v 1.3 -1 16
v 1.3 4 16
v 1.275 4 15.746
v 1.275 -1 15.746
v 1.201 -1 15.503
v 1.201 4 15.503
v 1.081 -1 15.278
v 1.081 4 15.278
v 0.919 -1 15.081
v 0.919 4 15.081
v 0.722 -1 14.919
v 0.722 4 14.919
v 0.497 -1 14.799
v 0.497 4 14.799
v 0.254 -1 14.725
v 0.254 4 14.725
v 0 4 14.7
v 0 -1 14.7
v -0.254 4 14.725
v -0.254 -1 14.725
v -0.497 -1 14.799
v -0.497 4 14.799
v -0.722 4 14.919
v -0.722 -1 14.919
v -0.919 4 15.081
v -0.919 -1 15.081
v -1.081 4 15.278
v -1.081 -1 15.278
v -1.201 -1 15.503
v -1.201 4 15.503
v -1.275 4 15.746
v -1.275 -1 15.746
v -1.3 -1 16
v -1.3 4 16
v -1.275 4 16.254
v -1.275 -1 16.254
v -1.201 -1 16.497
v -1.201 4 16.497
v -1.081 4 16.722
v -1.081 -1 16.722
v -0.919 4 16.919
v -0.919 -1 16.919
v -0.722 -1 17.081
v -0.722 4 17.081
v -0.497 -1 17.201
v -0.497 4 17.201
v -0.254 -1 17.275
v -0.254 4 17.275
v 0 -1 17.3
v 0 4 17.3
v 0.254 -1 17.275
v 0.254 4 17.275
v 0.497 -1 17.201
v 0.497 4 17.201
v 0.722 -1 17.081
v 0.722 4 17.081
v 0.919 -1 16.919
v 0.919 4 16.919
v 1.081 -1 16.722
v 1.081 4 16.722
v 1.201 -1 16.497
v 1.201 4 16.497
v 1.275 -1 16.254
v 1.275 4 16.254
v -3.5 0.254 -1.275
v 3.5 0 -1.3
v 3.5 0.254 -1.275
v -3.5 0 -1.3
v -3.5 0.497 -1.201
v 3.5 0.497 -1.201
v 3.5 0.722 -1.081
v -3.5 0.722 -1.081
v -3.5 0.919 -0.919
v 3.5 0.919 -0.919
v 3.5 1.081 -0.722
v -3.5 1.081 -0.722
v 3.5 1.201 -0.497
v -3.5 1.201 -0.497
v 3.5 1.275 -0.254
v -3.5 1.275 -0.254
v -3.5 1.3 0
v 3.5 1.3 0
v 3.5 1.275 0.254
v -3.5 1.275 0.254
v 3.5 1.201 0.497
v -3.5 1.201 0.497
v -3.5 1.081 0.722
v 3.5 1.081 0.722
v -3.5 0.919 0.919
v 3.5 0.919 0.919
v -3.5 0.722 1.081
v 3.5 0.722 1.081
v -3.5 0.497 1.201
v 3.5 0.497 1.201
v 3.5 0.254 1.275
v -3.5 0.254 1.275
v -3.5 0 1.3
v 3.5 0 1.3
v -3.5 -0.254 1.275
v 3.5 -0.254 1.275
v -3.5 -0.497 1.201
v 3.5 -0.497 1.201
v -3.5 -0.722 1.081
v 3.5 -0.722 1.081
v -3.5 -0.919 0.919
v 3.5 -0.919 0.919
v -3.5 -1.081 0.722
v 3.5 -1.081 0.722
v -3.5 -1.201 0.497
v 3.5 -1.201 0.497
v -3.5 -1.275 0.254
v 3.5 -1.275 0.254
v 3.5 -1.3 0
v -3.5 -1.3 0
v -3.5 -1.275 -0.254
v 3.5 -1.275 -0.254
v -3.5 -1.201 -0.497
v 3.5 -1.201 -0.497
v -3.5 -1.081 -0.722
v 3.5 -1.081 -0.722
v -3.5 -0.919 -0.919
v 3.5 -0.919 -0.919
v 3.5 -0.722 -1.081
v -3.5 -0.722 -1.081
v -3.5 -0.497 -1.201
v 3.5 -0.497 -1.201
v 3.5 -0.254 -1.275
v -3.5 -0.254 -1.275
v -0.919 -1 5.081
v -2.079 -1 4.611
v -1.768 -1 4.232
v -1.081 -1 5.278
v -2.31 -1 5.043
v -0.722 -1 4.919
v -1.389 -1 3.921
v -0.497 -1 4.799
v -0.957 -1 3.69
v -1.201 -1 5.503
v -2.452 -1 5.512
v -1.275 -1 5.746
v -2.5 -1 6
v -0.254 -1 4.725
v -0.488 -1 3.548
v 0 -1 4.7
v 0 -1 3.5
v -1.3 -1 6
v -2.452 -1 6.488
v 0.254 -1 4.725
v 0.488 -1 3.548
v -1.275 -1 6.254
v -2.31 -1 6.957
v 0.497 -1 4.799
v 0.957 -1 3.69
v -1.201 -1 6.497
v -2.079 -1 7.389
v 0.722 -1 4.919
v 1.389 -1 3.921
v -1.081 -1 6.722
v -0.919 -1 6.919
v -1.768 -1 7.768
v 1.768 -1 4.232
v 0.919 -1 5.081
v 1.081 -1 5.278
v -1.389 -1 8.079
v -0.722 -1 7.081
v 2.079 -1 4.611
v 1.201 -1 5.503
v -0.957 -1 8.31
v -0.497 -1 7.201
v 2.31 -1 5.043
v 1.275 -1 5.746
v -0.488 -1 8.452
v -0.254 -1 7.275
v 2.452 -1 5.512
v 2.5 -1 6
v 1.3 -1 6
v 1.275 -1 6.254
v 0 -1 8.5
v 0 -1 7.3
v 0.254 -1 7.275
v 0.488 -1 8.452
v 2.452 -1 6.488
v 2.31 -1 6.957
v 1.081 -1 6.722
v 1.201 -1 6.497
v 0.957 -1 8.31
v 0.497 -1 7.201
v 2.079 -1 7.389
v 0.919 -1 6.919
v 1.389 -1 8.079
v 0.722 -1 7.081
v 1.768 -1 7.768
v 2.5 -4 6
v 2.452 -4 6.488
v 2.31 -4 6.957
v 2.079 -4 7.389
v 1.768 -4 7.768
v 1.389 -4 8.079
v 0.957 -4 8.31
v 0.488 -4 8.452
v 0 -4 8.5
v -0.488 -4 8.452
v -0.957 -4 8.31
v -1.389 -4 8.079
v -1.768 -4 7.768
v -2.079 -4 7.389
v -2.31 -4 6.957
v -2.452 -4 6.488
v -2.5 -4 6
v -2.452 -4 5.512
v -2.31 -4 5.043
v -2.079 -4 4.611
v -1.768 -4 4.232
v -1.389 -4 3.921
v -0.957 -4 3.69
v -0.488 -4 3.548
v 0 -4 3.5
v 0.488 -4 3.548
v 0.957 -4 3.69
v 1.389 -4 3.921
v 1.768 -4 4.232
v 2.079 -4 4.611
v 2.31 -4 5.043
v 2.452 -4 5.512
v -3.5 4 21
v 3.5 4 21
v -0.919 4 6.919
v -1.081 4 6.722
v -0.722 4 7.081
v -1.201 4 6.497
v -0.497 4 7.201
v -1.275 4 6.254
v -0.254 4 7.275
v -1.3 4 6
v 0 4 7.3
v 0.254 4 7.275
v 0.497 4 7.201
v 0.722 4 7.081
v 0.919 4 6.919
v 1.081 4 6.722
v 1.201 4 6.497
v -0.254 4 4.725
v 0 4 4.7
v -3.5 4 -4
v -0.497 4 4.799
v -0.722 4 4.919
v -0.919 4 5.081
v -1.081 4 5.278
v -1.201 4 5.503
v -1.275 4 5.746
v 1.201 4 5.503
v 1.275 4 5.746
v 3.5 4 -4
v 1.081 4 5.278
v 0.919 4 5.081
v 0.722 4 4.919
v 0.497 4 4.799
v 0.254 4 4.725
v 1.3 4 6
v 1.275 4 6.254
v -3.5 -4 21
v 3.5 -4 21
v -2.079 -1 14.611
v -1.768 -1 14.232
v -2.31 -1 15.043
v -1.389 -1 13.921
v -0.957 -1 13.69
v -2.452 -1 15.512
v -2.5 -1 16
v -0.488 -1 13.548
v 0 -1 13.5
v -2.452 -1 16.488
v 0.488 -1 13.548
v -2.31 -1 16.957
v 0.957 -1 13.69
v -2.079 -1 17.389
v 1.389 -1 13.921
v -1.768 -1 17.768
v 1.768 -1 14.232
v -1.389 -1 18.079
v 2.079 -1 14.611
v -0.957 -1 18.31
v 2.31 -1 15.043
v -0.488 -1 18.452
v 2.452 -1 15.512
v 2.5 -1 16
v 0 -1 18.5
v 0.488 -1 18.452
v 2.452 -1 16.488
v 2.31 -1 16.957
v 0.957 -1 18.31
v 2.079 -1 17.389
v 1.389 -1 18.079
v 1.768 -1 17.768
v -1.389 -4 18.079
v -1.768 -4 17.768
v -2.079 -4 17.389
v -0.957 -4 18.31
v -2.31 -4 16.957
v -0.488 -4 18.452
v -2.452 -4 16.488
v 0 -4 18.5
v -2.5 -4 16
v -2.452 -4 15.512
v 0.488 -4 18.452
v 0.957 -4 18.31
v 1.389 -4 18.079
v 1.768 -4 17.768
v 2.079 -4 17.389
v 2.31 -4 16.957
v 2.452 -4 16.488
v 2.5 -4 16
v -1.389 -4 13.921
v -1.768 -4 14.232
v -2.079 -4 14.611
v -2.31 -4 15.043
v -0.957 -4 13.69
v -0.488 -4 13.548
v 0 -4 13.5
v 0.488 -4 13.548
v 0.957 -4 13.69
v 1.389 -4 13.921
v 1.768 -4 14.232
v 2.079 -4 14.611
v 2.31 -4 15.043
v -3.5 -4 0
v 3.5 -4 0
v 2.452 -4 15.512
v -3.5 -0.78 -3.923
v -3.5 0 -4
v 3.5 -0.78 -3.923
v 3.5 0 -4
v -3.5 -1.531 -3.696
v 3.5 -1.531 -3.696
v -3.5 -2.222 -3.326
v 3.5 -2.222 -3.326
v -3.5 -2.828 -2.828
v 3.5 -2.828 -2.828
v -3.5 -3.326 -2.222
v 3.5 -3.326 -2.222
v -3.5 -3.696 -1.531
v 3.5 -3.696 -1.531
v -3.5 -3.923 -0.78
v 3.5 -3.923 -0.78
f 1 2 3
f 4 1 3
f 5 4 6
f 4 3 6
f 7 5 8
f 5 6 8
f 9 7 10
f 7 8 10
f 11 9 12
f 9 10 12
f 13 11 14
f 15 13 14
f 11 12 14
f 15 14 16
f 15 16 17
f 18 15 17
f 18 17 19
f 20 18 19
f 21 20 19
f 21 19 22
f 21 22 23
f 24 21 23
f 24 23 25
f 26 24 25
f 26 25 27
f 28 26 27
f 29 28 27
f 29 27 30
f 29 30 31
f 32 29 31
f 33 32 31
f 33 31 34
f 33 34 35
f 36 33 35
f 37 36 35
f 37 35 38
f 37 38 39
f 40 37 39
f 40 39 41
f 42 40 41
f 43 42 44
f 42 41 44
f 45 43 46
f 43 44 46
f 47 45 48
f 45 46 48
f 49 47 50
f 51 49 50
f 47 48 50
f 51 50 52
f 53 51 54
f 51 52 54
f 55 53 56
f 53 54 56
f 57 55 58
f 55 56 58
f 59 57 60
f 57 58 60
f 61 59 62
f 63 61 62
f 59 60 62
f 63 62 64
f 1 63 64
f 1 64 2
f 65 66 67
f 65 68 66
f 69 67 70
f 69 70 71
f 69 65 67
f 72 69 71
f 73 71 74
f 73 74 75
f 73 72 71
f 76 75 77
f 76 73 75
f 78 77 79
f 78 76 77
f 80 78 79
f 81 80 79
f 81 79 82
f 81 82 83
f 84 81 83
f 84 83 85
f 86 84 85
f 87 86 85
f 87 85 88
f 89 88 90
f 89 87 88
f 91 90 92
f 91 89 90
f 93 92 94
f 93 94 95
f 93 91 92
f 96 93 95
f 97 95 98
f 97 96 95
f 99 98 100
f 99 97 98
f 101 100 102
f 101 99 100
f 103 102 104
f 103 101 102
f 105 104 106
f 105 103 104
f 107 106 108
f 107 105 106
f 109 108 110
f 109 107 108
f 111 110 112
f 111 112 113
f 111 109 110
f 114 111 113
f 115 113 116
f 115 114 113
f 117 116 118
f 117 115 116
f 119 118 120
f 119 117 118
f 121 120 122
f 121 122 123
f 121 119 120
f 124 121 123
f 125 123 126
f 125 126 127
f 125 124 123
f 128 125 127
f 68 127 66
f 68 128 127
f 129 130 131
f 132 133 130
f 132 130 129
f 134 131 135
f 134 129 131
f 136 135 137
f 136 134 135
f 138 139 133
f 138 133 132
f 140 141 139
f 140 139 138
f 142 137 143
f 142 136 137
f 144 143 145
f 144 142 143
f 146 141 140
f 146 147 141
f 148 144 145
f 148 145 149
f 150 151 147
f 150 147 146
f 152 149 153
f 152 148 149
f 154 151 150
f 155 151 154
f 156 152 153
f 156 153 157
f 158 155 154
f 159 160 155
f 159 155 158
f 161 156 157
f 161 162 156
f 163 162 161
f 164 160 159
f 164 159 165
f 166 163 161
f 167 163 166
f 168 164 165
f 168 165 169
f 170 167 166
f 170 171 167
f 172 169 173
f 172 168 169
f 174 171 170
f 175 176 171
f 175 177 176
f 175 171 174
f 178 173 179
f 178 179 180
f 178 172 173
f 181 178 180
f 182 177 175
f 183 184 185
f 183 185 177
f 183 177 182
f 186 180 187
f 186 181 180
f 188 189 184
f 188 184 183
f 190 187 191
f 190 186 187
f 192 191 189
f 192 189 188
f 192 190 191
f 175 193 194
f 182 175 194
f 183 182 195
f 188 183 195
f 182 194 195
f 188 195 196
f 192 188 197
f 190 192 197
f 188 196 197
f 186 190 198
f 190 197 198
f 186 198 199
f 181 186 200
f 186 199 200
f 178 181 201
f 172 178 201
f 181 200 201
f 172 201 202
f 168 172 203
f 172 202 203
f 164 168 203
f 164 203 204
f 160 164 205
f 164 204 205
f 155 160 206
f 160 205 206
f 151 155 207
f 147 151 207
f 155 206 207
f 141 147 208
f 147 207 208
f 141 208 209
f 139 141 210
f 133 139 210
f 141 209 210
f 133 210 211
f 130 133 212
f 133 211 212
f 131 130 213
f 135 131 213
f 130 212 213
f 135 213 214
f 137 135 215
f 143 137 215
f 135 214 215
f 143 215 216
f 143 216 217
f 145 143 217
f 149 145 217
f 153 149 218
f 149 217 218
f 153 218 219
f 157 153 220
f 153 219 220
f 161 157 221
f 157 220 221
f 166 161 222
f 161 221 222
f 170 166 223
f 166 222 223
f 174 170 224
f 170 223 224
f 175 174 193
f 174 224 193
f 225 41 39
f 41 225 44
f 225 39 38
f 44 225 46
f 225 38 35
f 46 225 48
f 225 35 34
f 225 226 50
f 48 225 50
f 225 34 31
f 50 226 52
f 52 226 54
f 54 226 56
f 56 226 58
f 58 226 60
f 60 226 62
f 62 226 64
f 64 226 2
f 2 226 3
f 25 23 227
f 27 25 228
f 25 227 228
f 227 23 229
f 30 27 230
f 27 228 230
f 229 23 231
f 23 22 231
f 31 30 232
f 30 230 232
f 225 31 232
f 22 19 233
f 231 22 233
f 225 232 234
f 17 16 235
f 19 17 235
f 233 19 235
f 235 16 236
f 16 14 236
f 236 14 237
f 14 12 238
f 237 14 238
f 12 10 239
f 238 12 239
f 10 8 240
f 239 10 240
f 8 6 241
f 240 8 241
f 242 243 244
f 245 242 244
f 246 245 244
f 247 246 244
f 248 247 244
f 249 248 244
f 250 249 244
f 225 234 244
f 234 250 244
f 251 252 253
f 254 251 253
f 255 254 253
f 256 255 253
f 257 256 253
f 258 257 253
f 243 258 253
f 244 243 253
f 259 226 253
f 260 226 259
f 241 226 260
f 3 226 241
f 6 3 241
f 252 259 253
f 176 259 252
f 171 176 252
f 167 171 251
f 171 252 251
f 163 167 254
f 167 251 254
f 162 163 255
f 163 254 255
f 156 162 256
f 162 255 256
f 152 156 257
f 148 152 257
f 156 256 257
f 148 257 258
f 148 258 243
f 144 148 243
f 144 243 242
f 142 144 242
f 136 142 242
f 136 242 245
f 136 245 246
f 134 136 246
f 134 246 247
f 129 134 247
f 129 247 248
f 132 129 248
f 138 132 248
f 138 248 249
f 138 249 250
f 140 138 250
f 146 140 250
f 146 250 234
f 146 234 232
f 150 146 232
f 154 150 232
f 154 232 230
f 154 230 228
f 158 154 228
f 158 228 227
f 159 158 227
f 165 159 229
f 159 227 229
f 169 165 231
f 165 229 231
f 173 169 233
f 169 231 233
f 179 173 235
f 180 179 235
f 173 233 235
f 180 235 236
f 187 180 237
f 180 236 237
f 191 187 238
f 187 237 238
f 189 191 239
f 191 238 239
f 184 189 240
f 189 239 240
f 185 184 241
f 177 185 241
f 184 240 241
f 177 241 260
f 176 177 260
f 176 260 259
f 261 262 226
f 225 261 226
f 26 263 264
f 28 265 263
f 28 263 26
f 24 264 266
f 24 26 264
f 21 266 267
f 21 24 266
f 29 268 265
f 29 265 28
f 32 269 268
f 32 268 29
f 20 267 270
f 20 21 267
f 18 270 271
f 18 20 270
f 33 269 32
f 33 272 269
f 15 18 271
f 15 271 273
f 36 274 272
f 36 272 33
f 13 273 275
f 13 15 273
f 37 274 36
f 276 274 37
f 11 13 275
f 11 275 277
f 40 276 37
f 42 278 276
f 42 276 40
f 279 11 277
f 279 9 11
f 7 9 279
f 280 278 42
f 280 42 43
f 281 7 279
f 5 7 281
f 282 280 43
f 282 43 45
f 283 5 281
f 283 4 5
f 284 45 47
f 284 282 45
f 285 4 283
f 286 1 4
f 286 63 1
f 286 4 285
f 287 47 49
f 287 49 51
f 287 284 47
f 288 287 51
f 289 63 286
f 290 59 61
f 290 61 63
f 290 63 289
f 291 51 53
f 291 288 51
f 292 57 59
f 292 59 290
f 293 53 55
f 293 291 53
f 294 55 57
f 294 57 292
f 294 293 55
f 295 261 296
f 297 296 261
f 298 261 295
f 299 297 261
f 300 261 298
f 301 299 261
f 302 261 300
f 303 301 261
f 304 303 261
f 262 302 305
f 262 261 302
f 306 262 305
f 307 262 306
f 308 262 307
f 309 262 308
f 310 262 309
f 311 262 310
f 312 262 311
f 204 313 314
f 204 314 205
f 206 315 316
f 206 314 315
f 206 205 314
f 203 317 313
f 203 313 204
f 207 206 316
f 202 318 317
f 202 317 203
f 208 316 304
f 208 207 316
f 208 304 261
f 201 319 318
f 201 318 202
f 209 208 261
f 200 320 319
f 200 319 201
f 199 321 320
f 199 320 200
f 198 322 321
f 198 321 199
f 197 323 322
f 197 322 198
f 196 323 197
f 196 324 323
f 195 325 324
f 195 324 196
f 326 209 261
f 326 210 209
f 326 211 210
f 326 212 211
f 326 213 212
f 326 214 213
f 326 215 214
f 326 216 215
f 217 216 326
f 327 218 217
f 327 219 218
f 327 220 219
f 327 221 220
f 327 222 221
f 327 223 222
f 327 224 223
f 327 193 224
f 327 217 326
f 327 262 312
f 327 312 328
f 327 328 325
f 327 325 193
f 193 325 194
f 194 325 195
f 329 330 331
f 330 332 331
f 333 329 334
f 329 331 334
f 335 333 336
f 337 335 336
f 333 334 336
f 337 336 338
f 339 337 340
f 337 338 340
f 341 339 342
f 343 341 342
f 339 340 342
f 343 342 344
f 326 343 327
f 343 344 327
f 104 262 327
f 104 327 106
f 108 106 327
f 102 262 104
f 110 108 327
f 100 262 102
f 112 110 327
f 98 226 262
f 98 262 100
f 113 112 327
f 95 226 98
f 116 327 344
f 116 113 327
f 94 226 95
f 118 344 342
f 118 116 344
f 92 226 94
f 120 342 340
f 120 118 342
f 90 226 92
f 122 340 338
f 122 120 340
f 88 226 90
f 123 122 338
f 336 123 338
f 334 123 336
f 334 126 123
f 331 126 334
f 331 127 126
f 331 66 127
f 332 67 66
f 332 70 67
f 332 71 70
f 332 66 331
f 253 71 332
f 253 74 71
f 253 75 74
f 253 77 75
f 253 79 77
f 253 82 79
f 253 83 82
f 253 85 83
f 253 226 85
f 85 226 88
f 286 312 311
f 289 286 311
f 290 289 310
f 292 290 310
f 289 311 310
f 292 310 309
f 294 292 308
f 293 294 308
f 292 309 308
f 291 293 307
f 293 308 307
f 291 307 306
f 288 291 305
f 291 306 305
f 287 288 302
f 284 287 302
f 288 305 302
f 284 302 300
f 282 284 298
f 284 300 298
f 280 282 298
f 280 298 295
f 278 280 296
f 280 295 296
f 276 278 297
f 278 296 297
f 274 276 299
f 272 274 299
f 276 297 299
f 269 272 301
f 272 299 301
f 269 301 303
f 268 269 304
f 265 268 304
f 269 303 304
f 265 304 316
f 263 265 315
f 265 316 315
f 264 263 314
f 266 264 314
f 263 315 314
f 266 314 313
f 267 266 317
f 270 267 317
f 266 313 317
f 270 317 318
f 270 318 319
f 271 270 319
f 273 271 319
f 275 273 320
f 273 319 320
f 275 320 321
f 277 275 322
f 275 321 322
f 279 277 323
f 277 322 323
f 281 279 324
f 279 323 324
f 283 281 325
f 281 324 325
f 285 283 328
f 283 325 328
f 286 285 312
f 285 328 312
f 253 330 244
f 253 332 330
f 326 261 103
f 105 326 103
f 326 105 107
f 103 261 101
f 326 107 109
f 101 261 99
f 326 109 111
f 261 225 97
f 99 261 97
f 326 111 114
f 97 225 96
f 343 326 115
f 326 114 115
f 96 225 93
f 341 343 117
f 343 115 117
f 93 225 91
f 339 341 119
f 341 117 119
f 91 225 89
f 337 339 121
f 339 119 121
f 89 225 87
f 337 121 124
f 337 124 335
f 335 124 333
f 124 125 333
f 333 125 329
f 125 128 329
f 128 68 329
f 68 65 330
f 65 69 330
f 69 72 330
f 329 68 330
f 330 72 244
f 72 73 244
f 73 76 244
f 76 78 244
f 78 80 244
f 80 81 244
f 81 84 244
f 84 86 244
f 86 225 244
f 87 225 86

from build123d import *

# Parameters (mm, degrees)
SKETCH1_W           = 25
SKETCH1_H           = 8
SKETCH1_R           = 1.3
BOSS_EXTRUDE1_DEPTH = 3.5
FILLET1_R           = 4
SKETCH3_R           = 1.3
CUT_EXTRUDE6_DEPTH  = 9
SKETCH5_R           = 2.5
CUT_EXTRUDE7_DEPTH  = 3


with BuildPart() as part:
    # Sketch1 → Boss-Extrude1 (new body, symmetric)
    with BuildSketch(Plane(origin=(0, 0, 0), x_dir=(0, 0, -1), z_dir=(1, 0, 0))):
        with Locations((-8.5, 0)):
            Rectangle(SKETCH1_W, SKETCH1_H)
        Circle(SKETCH1_R, mode=Mode.SUBTRACT)
    extrude(amount=BOSS_EXTRUDE1_DEPTH, both=True)

    # Fillet1
    fillet1_edges = [part.edges().sort_by_distance(p)[0] for p in [
        (0, -4, -4),
    ]]
    fillet(fillet1_edges, radius=FILLET1_R)

    # Sketch3 → Cut-Extrude6 (cut, through all)
    with BuildSketch(Plane(origin=(0, 4, 0), x_dir=(1, 0, 0), z_dir=(0, 1, 0))):
        with Locations((0, -6)):
            Circle(SKETCH3_R)
        with Locations((0, -16)):
            Circle(SKETCH3_R)
    extrude(amount=-CUT_EXTRUDE6_DEPTH, mode=Mode.SUBTRACT)

    # Sketch5 → Cut-Extrude7 (cut)
    with BuildSketch(Plane.XZ.offset(4)):
        with Locations((0, 16)):
            Circle(SKETCH5_R)
        with Locations((0, 6)):
            Circle(SKETCH5_R)
    extrude(amount=-CUT_EXTRUDE7_DEPTH, mode=Mode.SUBTRACT)


solid = part.part
